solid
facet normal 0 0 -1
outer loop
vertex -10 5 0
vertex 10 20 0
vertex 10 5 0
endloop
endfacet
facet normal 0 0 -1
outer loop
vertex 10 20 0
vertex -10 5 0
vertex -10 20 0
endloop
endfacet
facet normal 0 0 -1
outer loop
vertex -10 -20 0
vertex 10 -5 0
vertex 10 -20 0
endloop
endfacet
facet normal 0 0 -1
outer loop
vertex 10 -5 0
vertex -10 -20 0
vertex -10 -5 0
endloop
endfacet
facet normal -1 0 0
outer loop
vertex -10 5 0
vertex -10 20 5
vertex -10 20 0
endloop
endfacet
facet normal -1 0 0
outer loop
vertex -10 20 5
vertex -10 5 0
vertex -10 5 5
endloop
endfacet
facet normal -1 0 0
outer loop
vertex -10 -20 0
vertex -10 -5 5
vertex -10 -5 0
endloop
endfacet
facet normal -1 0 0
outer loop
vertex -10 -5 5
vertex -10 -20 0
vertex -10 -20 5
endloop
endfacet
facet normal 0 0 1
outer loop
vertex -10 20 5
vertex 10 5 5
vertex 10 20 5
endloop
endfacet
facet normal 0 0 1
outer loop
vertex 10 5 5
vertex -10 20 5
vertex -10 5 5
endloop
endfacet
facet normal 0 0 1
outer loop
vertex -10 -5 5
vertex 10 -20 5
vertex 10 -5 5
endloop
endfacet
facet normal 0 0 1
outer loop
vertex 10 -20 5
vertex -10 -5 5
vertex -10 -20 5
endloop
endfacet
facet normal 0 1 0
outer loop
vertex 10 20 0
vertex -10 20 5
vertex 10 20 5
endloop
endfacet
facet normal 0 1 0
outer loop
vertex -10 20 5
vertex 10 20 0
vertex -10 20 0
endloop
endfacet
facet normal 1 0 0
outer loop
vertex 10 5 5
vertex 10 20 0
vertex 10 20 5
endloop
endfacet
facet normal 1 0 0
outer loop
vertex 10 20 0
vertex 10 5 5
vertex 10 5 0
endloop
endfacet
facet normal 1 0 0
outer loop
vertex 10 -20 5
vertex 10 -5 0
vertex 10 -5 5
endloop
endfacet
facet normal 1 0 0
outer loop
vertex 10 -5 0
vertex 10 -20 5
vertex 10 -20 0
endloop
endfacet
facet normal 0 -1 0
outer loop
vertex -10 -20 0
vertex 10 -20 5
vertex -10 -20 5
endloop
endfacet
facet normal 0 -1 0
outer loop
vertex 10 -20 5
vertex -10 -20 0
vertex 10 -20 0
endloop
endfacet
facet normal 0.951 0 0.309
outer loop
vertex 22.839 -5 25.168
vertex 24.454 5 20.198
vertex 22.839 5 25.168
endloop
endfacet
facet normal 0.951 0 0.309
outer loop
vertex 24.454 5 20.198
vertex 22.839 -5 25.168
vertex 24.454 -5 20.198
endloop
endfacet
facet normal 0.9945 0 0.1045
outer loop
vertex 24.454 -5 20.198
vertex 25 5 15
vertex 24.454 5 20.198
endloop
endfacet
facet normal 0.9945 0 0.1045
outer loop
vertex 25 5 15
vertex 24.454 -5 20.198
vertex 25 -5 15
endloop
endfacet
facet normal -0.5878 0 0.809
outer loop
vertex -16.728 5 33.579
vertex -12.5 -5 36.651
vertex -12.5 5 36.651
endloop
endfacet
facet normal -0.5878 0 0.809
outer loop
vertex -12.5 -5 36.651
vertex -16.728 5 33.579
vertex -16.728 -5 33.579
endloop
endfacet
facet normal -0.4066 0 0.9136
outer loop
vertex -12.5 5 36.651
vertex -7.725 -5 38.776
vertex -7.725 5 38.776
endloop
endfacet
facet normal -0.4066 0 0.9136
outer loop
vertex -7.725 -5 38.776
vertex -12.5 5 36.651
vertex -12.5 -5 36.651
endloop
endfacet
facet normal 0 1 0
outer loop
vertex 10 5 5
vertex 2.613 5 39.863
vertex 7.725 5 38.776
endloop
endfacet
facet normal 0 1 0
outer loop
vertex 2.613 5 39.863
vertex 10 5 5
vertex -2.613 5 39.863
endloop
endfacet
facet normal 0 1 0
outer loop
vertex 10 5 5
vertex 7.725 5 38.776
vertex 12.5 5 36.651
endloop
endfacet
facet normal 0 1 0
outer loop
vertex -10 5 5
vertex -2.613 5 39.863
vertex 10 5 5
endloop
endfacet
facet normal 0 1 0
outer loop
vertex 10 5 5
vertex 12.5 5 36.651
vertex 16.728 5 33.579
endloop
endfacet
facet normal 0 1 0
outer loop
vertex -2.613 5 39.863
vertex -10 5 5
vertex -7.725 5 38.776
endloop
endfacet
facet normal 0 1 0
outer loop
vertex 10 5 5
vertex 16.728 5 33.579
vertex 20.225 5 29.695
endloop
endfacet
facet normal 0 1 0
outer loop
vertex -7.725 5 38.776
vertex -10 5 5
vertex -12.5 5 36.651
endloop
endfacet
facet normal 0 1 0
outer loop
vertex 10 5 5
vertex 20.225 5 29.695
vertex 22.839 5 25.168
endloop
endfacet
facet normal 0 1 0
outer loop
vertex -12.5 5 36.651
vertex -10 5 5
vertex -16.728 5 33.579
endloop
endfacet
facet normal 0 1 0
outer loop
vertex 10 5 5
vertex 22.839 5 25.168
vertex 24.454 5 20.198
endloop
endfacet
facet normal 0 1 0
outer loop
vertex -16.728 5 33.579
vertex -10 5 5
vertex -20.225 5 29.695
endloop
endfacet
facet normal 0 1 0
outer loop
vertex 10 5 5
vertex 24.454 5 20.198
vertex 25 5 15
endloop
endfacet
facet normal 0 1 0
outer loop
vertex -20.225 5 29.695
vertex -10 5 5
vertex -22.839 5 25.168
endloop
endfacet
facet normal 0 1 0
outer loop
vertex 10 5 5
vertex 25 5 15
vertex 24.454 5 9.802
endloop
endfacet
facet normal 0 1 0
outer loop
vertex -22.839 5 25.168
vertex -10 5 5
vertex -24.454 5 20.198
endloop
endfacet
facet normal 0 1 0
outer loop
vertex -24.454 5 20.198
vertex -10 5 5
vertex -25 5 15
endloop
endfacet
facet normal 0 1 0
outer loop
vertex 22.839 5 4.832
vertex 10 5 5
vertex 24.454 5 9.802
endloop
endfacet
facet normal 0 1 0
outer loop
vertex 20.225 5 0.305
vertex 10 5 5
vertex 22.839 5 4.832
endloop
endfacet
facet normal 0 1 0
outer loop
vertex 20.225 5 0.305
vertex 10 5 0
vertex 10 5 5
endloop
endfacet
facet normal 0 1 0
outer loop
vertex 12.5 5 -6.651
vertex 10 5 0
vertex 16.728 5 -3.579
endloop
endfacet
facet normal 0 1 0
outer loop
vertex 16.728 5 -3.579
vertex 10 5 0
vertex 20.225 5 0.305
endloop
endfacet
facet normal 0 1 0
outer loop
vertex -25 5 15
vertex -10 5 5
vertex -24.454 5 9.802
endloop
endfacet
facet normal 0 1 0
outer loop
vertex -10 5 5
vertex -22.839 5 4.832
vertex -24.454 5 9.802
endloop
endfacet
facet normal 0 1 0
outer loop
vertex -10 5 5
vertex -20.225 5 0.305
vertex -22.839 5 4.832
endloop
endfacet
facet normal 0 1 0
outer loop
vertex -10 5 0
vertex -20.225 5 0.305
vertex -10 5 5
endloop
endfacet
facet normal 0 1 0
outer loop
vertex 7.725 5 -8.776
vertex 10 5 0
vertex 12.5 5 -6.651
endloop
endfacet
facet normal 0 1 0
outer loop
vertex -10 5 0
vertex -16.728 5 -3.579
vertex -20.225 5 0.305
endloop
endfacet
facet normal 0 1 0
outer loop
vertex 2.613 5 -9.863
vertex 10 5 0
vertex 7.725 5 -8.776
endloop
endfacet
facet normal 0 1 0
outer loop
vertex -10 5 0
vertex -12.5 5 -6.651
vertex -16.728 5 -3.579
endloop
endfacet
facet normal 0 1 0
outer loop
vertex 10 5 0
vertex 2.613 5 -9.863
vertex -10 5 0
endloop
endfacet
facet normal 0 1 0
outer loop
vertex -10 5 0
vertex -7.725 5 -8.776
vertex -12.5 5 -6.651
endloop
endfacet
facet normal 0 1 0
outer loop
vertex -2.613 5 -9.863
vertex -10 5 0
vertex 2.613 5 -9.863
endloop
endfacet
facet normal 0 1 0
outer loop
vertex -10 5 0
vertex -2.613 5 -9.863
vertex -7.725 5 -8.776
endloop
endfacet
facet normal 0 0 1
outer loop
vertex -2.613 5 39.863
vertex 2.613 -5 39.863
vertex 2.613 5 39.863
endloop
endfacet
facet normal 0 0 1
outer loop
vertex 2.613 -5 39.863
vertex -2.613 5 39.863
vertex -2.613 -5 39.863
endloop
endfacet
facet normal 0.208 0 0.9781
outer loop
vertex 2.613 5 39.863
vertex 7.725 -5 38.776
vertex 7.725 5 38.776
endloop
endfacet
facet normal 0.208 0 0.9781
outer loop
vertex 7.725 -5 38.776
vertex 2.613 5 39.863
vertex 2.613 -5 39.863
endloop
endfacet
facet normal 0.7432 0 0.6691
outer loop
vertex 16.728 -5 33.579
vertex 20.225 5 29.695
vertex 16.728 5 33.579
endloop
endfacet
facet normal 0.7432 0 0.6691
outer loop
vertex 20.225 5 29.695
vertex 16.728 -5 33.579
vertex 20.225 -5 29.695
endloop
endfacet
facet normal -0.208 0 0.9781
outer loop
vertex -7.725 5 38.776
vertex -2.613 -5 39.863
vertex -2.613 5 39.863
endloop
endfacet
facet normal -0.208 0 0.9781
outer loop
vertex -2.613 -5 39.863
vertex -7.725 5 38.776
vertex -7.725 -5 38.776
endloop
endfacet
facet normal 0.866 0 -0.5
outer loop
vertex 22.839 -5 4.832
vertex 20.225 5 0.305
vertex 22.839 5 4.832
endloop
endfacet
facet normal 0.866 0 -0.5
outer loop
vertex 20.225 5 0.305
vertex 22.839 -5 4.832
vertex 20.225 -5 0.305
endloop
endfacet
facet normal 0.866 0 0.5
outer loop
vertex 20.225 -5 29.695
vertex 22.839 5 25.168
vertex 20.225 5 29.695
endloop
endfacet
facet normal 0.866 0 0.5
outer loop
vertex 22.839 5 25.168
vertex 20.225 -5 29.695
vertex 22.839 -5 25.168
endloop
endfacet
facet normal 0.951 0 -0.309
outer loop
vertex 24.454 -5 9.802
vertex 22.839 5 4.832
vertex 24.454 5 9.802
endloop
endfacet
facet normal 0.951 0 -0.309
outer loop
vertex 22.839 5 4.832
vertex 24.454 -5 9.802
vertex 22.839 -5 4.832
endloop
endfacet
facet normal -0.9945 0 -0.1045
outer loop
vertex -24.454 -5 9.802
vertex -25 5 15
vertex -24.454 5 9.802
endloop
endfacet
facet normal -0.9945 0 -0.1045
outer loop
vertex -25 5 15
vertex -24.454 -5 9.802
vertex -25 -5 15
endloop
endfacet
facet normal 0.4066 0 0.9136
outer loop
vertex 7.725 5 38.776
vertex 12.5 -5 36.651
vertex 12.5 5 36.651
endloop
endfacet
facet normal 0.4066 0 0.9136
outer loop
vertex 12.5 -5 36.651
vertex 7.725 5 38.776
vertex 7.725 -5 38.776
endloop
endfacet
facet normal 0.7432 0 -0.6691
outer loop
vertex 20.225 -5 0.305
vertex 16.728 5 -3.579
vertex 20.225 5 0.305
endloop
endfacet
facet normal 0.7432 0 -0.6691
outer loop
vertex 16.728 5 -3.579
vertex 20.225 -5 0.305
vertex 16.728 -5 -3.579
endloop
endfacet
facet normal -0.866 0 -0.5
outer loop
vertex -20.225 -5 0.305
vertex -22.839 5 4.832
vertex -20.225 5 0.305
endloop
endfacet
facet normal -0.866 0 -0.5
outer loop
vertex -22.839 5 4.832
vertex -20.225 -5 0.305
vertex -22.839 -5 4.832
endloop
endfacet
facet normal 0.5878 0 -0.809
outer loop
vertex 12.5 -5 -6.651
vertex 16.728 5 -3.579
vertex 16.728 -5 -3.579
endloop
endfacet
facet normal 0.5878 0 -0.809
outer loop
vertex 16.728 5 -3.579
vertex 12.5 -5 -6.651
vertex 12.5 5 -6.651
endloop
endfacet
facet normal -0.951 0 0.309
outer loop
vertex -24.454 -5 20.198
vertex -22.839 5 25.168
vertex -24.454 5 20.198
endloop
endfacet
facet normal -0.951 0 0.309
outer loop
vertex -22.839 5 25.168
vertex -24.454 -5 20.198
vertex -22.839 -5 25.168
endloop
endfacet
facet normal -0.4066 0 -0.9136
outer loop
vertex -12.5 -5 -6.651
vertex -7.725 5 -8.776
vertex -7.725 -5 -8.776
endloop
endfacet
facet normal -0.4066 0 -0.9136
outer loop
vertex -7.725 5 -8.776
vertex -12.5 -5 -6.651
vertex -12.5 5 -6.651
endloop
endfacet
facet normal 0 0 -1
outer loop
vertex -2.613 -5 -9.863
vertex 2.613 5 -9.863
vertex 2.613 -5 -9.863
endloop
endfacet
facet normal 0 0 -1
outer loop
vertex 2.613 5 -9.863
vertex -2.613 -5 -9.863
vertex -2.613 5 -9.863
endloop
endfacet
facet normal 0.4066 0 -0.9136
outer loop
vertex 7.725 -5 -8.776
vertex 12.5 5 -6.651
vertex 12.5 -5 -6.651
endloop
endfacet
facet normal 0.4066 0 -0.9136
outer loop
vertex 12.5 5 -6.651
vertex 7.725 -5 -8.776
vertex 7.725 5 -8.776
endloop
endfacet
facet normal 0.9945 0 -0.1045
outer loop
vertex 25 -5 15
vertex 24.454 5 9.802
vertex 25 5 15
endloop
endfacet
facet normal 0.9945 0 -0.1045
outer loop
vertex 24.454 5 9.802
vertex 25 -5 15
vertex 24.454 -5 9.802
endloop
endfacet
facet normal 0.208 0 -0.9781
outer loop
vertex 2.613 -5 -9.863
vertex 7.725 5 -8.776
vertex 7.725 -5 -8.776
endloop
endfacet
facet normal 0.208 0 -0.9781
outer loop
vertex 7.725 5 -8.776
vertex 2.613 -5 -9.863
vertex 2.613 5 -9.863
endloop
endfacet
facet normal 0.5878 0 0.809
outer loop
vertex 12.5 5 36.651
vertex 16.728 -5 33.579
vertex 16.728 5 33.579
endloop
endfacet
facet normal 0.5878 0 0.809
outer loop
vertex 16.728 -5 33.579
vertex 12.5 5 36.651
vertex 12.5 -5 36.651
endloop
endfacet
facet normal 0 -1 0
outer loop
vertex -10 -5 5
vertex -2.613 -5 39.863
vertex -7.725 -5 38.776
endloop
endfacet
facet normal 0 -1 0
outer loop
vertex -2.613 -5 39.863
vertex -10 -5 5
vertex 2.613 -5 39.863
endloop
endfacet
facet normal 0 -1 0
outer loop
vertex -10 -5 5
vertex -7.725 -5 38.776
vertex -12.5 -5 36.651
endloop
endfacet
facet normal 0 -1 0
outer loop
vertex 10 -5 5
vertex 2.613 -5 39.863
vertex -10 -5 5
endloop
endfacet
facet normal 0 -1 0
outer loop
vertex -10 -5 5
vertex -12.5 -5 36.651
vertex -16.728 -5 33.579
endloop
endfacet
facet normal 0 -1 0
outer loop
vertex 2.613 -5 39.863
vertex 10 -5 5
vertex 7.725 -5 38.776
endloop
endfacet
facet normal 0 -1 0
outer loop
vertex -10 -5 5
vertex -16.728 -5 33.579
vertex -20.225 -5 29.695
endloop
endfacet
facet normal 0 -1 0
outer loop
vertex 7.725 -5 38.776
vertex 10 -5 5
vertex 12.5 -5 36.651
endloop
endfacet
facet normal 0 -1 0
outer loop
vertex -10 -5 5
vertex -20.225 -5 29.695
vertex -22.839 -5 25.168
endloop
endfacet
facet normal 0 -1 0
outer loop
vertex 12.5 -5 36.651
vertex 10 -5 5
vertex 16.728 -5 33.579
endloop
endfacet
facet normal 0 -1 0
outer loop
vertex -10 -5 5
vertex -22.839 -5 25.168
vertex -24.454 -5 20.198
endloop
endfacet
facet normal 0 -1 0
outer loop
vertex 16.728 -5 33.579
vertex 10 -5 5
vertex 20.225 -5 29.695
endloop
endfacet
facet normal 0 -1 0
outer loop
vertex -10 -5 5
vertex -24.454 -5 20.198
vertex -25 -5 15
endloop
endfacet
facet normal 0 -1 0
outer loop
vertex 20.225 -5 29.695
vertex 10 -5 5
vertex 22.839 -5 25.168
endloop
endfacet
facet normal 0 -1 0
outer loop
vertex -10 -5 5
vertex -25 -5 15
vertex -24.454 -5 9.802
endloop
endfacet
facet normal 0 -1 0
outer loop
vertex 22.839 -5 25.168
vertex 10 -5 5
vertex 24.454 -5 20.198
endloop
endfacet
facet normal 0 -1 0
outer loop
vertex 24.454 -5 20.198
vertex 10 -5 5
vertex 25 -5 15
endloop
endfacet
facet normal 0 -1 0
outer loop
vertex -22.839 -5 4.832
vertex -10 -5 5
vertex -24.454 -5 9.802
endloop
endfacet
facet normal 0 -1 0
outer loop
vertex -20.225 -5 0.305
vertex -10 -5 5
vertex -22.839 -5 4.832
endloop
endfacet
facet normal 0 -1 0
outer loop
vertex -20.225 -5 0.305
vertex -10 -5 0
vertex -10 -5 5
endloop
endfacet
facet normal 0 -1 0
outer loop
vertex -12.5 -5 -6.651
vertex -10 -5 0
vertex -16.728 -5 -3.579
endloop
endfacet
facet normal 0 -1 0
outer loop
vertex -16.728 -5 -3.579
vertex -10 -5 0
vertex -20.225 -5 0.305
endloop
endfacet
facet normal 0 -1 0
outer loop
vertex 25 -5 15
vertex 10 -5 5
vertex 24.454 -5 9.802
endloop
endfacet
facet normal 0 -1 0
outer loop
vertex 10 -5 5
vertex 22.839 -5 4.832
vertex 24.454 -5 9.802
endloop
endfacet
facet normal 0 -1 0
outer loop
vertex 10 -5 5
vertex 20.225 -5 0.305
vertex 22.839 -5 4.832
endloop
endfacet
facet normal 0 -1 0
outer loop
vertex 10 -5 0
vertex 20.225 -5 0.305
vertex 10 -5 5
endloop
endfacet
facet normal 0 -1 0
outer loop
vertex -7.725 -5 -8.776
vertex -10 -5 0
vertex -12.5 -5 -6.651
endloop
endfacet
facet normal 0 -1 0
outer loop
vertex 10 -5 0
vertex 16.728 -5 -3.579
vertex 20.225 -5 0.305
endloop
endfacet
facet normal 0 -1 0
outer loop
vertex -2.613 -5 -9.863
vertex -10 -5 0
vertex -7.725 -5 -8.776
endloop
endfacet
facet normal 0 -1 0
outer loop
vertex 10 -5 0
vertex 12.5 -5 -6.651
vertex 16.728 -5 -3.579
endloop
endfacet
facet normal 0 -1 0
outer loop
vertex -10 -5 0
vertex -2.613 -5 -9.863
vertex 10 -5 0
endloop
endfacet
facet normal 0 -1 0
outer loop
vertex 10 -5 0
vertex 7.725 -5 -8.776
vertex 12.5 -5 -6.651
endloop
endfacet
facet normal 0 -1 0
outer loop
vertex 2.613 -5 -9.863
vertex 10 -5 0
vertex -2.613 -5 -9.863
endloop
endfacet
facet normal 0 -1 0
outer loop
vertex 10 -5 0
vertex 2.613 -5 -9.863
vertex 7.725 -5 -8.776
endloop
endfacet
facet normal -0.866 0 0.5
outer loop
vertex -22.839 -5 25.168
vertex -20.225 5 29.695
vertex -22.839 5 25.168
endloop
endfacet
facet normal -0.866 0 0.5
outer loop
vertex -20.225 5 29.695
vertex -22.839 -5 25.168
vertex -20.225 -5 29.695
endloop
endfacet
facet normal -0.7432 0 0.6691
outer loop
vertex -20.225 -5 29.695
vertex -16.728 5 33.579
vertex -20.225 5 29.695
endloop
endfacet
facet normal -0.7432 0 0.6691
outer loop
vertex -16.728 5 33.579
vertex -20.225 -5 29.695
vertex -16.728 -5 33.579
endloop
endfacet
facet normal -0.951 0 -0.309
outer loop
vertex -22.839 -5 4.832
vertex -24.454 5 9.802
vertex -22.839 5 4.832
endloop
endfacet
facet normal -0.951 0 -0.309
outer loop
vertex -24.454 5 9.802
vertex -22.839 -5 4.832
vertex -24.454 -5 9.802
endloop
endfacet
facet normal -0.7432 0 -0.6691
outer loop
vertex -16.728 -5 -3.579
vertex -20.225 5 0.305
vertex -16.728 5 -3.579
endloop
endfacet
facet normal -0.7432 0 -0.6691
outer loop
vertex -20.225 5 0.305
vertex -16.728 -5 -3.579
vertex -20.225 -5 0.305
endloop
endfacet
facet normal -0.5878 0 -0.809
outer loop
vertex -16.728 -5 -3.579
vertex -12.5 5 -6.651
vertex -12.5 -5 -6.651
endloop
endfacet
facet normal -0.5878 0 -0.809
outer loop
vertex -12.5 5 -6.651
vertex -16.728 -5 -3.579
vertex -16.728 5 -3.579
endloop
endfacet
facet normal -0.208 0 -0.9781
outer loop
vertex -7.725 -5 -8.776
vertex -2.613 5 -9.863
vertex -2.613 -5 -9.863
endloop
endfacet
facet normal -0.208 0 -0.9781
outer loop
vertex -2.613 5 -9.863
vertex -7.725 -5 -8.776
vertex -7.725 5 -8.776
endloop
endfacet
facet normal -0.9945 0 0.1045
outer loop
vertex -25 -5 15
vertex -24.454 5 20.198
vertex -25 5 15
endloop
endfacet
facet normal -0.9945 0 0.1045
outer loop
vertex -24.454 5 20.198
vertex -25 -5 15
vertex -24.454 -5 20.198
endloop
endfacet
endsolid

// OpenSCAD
width= 20;
height = 5;
length = 40;
broom= 25;

linear_extrude(height){
    square([width, length], center=true);
}
translate([0,0,height*3]){
    rotate ([90,0,0]) cylinder (h = 10, r=broom, center = true);
}
